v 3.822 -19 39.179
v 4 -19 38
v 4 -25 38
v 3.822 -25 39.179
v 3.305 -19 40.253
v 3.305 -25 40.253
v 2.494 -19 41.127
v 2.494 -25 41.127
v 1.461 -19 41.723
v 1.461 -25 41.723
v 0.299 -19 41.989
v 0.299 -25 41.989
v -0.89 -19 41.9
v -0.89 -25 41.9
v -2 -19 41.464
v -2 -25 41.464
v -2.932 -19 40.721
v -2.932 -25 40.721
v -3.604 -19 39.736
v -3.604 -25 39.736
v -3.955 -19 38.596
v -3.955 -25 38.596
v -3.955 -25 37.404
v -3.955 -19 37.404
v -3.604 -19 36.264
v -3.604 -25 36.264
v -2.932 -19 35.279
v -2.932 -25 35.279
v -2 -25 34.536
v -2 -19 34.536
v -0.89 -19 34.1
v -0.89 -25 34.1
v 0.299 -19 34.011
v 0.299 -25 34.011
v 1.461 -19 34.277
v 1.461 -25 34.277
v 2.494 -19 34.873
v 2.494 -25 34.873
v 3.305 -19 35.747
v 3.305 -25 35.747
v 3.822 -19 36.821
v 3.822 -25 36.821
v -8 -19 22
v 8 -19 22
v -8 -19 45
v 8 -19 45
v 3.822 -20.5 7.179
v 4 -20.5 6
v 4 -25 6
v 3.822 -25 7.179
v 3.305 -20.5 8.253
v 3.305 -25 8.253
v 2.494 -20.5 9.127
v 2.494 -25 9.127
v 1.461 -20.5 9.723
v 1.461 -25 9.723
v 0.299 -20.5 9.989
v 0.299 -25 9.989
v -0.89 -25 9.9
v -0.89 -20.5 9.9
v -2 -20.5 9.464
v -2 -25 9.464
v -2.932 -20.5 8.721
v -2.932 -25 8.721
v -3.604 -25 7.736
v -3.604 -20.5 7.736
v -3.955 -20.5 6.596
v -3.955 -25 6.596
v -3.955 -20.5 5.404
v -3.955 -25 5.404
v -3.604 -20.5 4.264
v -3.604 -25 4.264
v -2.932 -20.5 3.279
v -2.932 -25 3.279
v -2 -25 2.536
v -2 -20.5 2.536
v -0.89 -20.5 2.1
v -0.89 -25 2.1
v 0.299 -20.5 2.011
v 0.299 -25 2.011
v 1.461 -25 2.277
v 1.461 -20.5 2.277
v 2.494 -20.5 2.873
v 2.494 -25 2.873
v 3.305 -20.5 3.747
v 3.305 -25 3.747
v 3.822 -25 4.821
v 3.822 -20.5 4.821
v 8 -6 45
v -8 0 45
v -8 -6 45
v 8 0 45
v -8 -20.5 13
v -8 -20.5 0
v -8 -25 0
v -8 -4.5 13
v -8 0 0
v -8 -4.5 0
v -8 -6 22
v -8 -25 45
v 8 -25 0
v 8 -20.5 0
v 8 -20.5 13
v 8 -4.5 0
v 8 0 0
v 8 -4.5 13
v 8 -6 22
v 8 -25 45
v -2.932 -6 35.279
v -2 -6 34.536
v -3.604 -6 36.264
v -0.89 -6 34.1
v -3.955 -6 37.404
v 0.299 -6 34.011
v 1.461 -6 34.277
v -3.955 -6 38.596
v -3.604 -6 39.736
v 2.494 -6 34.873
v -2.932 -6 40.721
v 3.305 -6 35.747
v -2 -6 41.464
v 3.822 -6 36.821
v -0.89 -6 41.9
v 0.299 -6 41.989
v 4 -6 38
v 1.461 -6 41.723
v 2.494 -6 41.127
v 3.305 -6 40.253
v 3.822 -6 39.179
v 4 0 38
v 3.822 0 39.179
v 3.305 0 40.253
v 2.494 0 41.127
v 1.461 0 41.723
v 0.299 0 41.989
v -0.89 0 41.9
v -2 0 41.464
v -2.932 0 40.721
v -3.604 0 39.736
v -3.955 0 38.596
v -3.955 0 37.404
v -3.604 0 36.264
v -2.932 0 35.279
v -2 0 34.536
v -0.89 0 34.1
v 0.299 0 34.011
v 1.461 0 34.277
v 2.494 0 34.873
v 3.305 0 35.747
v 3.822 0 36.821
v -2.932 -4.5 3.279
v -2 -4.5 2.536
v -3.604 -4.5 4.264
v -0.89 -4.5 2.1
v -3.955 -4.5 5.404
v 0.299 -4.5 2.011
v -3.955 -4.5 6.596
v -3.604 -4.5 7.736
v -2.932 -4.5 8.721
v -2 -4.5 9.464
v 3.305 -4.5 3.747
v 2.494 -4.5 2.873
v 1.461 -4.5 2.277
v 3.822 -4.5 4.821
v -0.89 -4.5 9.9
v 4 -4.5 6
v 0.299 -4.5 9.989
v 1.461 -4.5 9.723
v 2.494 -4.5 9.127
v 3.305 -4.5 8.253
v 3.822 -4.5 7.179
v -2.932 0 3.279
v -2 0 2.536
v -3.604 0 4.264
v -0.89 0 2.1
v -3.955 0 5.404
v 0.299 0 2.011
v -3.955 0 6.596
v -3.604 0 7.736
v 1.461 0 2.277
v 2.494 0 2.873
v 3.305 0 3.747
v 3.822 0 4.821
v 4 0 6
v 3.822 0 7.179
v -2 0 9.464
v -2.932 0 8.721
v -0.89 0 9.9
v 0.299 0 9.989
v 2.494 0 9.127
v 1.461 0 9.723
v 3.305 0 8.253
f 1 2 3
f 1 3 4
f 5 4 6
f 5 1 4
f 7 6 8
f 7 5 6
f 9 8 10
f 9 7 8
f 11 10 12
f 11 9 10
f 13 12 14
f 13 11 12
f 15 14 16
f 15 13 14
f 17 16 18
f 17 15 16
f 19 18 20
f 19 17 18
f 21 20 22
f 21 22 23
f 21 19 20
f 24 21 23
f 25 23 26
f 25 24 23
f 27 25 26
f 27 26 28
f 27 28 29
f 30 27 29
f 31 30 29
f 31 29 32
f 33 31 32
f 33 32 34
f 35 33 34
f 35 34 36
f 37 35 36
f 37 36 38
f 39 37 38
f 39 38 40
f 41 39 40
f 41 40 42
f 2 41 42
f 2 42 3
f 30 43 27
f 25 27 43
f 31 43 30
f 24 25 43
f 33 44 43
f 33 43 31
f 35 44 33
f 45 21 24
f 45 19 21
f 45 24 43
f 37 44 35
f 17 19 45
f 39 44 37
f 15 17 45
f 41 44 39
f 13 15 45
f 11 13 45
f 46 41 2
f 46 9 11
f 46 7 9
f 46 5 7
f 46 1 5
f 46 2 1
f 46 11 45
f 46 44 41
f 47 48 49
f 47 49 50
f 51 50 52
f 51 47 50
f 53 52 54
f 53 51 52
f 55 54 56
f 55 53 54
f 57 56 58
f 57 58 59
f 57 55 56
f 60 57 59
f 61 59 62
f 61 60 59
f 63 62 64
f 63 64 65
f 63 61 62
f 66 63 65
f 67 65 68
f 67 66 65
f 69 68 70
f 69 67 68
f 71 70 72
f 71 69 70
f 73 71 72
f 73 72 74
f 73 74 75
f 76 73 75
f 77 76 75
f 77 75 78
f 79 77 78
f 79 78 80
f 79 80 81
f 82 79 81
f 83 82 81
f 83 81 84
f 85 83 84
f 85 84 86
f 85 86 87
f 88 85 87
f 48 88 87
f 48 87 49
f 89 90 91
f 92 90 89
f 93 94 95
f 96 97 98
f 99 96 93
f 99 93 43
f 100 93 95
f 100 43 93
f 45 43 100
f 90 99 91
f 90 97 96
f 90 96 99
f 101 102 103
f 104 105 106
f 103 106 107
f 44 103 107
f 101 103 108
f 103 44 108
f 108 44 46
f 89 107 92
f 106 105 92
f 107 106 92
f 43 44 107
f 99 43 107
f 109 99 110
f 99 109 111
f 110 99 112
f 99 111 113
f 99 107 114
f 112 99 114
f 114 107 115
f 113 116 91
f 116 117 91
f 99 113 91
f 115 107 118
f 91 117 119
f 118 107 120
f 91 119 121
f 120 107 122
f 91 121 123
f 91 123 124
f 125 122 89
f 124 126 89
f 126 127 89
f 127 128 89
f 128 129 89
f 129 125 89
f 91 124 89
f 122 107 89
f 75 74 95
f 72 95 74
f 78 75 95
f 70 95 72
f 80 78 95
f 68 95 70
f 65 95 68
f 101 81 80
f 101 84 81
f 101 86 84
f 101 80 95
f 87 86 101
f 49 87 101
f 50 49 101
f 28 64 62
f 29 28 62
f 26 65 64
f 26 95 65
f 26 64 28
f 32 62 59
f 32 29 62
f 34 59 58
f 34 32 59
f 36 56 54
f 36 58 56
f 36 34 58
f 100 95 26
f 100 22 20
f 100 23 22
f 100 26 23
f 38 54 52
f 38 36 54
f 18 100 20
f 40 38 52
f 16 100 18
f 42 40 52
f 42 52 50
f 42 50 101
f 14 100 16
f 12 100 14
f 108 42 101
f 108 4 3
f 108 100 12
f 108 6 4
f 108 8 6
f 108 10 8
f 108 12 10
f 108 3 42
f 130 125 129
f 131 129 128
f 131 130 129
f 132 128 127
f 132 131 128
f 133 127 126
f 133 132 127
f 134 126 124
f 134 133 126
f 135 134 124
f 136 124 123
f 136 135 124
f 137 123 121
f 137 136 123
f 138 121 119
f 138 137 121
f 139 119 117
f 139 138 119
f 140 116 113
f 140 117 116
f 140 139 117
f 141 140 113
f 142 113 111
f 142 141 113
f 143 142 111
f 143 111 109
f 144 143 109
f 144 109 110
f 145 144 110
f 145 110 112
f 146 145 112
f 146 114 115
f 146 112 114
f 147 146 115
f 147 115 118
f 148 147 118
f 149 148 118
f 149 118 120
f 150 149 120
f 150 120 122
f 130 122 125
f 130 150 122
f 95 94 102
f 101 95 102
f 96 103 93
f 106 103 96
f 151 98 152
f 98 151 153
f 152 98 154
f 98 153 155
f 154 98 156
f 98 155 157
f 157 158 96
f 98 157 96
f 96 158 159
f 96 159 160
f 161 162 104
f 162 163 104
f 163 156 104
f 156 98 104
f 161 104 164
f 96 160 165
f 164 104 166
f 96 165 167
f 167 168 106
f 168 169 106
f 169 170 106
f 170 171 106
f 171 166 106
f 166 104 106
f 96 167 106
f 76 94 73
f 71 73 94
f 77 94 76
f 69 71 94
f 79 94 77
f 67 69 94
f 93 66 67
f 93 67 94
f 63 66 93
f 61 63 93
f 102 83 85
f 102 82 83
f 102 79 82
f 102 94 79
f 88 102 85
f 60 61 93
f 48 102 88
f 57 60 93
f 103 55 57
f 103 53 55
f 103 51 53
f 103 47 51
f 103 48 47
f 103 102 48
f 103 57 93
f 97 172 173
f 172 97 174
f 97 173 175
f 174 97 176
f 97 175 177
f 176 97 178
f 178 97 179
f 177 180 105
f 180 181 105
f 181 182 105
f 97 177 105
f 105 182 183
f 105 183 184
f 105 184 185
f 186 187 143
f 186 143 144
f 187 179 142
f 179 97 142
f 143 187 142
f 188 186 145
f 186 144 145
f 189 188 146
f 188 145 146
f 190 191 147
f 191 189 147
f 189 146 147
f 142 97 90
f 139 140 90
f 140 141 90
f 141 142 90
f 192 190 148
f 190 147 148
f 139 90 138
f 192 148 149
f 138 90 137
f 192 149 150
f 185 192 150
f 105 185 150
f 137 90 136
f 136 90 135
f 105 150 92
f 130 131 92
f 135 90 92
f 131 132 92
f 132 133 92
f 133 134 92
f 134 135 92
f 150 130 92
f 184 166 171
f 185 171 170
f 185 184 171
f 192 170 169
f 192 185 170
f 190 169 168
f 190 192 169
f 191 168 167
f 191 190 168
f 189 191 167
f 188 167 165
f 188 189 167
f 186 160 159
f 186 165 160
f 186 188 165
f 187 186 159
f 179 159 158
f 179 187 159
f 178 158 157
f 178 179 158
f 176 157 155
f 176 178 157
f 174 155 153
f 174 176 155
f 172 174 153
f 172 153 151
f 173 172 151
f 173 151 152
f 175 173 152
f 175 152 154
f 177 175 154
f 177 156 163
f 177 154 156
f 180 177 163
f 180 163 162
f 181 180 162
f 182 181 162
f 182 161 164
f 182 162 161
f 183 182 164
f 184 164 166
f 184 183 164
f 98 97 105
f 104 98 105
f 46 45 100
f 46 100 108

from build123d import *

# Parameters (mm, degrees)
F0_W     = 16
F0_H     = 45
F0_R     = 4
F1_DEPTH = 25
F2_W     = 16
F2_H     = 13
F2_W_2   = 13
F2_H_2   = 23
F3_DEPTH = 16.001


with BuildPart() as f1:
    # F0 (on Front) → F1 (new body)
    with BuildSketch(Plane.XZ):
        with Locations((0, 22.5)):
            Rectangle(F0_W, F0_H)
        with Locations((0, 6)):
            Circle(F0_R, mode=Mode.SUBTRACT)
        with Locations((0, 38)):
            Circle(F0_R, mode=Mode.SUBTRACT)
    extrude(amount=F1_DEPTH)

    # F2 (on face) → F3 (cut, through all)
    with BuildSketch(Plane.YZ.offset(8)):
        with Locations((-12.5, 6.5)):
            Rectangle(F2_W, F2_H)
        with Locations((-12.5, 33.5)):
            Rectangle(F2_W_2, F2_H_2)
    extrude(amount=-F3_DEPTH, mode=Mode.SUBTRACT)


solid = f1.part
